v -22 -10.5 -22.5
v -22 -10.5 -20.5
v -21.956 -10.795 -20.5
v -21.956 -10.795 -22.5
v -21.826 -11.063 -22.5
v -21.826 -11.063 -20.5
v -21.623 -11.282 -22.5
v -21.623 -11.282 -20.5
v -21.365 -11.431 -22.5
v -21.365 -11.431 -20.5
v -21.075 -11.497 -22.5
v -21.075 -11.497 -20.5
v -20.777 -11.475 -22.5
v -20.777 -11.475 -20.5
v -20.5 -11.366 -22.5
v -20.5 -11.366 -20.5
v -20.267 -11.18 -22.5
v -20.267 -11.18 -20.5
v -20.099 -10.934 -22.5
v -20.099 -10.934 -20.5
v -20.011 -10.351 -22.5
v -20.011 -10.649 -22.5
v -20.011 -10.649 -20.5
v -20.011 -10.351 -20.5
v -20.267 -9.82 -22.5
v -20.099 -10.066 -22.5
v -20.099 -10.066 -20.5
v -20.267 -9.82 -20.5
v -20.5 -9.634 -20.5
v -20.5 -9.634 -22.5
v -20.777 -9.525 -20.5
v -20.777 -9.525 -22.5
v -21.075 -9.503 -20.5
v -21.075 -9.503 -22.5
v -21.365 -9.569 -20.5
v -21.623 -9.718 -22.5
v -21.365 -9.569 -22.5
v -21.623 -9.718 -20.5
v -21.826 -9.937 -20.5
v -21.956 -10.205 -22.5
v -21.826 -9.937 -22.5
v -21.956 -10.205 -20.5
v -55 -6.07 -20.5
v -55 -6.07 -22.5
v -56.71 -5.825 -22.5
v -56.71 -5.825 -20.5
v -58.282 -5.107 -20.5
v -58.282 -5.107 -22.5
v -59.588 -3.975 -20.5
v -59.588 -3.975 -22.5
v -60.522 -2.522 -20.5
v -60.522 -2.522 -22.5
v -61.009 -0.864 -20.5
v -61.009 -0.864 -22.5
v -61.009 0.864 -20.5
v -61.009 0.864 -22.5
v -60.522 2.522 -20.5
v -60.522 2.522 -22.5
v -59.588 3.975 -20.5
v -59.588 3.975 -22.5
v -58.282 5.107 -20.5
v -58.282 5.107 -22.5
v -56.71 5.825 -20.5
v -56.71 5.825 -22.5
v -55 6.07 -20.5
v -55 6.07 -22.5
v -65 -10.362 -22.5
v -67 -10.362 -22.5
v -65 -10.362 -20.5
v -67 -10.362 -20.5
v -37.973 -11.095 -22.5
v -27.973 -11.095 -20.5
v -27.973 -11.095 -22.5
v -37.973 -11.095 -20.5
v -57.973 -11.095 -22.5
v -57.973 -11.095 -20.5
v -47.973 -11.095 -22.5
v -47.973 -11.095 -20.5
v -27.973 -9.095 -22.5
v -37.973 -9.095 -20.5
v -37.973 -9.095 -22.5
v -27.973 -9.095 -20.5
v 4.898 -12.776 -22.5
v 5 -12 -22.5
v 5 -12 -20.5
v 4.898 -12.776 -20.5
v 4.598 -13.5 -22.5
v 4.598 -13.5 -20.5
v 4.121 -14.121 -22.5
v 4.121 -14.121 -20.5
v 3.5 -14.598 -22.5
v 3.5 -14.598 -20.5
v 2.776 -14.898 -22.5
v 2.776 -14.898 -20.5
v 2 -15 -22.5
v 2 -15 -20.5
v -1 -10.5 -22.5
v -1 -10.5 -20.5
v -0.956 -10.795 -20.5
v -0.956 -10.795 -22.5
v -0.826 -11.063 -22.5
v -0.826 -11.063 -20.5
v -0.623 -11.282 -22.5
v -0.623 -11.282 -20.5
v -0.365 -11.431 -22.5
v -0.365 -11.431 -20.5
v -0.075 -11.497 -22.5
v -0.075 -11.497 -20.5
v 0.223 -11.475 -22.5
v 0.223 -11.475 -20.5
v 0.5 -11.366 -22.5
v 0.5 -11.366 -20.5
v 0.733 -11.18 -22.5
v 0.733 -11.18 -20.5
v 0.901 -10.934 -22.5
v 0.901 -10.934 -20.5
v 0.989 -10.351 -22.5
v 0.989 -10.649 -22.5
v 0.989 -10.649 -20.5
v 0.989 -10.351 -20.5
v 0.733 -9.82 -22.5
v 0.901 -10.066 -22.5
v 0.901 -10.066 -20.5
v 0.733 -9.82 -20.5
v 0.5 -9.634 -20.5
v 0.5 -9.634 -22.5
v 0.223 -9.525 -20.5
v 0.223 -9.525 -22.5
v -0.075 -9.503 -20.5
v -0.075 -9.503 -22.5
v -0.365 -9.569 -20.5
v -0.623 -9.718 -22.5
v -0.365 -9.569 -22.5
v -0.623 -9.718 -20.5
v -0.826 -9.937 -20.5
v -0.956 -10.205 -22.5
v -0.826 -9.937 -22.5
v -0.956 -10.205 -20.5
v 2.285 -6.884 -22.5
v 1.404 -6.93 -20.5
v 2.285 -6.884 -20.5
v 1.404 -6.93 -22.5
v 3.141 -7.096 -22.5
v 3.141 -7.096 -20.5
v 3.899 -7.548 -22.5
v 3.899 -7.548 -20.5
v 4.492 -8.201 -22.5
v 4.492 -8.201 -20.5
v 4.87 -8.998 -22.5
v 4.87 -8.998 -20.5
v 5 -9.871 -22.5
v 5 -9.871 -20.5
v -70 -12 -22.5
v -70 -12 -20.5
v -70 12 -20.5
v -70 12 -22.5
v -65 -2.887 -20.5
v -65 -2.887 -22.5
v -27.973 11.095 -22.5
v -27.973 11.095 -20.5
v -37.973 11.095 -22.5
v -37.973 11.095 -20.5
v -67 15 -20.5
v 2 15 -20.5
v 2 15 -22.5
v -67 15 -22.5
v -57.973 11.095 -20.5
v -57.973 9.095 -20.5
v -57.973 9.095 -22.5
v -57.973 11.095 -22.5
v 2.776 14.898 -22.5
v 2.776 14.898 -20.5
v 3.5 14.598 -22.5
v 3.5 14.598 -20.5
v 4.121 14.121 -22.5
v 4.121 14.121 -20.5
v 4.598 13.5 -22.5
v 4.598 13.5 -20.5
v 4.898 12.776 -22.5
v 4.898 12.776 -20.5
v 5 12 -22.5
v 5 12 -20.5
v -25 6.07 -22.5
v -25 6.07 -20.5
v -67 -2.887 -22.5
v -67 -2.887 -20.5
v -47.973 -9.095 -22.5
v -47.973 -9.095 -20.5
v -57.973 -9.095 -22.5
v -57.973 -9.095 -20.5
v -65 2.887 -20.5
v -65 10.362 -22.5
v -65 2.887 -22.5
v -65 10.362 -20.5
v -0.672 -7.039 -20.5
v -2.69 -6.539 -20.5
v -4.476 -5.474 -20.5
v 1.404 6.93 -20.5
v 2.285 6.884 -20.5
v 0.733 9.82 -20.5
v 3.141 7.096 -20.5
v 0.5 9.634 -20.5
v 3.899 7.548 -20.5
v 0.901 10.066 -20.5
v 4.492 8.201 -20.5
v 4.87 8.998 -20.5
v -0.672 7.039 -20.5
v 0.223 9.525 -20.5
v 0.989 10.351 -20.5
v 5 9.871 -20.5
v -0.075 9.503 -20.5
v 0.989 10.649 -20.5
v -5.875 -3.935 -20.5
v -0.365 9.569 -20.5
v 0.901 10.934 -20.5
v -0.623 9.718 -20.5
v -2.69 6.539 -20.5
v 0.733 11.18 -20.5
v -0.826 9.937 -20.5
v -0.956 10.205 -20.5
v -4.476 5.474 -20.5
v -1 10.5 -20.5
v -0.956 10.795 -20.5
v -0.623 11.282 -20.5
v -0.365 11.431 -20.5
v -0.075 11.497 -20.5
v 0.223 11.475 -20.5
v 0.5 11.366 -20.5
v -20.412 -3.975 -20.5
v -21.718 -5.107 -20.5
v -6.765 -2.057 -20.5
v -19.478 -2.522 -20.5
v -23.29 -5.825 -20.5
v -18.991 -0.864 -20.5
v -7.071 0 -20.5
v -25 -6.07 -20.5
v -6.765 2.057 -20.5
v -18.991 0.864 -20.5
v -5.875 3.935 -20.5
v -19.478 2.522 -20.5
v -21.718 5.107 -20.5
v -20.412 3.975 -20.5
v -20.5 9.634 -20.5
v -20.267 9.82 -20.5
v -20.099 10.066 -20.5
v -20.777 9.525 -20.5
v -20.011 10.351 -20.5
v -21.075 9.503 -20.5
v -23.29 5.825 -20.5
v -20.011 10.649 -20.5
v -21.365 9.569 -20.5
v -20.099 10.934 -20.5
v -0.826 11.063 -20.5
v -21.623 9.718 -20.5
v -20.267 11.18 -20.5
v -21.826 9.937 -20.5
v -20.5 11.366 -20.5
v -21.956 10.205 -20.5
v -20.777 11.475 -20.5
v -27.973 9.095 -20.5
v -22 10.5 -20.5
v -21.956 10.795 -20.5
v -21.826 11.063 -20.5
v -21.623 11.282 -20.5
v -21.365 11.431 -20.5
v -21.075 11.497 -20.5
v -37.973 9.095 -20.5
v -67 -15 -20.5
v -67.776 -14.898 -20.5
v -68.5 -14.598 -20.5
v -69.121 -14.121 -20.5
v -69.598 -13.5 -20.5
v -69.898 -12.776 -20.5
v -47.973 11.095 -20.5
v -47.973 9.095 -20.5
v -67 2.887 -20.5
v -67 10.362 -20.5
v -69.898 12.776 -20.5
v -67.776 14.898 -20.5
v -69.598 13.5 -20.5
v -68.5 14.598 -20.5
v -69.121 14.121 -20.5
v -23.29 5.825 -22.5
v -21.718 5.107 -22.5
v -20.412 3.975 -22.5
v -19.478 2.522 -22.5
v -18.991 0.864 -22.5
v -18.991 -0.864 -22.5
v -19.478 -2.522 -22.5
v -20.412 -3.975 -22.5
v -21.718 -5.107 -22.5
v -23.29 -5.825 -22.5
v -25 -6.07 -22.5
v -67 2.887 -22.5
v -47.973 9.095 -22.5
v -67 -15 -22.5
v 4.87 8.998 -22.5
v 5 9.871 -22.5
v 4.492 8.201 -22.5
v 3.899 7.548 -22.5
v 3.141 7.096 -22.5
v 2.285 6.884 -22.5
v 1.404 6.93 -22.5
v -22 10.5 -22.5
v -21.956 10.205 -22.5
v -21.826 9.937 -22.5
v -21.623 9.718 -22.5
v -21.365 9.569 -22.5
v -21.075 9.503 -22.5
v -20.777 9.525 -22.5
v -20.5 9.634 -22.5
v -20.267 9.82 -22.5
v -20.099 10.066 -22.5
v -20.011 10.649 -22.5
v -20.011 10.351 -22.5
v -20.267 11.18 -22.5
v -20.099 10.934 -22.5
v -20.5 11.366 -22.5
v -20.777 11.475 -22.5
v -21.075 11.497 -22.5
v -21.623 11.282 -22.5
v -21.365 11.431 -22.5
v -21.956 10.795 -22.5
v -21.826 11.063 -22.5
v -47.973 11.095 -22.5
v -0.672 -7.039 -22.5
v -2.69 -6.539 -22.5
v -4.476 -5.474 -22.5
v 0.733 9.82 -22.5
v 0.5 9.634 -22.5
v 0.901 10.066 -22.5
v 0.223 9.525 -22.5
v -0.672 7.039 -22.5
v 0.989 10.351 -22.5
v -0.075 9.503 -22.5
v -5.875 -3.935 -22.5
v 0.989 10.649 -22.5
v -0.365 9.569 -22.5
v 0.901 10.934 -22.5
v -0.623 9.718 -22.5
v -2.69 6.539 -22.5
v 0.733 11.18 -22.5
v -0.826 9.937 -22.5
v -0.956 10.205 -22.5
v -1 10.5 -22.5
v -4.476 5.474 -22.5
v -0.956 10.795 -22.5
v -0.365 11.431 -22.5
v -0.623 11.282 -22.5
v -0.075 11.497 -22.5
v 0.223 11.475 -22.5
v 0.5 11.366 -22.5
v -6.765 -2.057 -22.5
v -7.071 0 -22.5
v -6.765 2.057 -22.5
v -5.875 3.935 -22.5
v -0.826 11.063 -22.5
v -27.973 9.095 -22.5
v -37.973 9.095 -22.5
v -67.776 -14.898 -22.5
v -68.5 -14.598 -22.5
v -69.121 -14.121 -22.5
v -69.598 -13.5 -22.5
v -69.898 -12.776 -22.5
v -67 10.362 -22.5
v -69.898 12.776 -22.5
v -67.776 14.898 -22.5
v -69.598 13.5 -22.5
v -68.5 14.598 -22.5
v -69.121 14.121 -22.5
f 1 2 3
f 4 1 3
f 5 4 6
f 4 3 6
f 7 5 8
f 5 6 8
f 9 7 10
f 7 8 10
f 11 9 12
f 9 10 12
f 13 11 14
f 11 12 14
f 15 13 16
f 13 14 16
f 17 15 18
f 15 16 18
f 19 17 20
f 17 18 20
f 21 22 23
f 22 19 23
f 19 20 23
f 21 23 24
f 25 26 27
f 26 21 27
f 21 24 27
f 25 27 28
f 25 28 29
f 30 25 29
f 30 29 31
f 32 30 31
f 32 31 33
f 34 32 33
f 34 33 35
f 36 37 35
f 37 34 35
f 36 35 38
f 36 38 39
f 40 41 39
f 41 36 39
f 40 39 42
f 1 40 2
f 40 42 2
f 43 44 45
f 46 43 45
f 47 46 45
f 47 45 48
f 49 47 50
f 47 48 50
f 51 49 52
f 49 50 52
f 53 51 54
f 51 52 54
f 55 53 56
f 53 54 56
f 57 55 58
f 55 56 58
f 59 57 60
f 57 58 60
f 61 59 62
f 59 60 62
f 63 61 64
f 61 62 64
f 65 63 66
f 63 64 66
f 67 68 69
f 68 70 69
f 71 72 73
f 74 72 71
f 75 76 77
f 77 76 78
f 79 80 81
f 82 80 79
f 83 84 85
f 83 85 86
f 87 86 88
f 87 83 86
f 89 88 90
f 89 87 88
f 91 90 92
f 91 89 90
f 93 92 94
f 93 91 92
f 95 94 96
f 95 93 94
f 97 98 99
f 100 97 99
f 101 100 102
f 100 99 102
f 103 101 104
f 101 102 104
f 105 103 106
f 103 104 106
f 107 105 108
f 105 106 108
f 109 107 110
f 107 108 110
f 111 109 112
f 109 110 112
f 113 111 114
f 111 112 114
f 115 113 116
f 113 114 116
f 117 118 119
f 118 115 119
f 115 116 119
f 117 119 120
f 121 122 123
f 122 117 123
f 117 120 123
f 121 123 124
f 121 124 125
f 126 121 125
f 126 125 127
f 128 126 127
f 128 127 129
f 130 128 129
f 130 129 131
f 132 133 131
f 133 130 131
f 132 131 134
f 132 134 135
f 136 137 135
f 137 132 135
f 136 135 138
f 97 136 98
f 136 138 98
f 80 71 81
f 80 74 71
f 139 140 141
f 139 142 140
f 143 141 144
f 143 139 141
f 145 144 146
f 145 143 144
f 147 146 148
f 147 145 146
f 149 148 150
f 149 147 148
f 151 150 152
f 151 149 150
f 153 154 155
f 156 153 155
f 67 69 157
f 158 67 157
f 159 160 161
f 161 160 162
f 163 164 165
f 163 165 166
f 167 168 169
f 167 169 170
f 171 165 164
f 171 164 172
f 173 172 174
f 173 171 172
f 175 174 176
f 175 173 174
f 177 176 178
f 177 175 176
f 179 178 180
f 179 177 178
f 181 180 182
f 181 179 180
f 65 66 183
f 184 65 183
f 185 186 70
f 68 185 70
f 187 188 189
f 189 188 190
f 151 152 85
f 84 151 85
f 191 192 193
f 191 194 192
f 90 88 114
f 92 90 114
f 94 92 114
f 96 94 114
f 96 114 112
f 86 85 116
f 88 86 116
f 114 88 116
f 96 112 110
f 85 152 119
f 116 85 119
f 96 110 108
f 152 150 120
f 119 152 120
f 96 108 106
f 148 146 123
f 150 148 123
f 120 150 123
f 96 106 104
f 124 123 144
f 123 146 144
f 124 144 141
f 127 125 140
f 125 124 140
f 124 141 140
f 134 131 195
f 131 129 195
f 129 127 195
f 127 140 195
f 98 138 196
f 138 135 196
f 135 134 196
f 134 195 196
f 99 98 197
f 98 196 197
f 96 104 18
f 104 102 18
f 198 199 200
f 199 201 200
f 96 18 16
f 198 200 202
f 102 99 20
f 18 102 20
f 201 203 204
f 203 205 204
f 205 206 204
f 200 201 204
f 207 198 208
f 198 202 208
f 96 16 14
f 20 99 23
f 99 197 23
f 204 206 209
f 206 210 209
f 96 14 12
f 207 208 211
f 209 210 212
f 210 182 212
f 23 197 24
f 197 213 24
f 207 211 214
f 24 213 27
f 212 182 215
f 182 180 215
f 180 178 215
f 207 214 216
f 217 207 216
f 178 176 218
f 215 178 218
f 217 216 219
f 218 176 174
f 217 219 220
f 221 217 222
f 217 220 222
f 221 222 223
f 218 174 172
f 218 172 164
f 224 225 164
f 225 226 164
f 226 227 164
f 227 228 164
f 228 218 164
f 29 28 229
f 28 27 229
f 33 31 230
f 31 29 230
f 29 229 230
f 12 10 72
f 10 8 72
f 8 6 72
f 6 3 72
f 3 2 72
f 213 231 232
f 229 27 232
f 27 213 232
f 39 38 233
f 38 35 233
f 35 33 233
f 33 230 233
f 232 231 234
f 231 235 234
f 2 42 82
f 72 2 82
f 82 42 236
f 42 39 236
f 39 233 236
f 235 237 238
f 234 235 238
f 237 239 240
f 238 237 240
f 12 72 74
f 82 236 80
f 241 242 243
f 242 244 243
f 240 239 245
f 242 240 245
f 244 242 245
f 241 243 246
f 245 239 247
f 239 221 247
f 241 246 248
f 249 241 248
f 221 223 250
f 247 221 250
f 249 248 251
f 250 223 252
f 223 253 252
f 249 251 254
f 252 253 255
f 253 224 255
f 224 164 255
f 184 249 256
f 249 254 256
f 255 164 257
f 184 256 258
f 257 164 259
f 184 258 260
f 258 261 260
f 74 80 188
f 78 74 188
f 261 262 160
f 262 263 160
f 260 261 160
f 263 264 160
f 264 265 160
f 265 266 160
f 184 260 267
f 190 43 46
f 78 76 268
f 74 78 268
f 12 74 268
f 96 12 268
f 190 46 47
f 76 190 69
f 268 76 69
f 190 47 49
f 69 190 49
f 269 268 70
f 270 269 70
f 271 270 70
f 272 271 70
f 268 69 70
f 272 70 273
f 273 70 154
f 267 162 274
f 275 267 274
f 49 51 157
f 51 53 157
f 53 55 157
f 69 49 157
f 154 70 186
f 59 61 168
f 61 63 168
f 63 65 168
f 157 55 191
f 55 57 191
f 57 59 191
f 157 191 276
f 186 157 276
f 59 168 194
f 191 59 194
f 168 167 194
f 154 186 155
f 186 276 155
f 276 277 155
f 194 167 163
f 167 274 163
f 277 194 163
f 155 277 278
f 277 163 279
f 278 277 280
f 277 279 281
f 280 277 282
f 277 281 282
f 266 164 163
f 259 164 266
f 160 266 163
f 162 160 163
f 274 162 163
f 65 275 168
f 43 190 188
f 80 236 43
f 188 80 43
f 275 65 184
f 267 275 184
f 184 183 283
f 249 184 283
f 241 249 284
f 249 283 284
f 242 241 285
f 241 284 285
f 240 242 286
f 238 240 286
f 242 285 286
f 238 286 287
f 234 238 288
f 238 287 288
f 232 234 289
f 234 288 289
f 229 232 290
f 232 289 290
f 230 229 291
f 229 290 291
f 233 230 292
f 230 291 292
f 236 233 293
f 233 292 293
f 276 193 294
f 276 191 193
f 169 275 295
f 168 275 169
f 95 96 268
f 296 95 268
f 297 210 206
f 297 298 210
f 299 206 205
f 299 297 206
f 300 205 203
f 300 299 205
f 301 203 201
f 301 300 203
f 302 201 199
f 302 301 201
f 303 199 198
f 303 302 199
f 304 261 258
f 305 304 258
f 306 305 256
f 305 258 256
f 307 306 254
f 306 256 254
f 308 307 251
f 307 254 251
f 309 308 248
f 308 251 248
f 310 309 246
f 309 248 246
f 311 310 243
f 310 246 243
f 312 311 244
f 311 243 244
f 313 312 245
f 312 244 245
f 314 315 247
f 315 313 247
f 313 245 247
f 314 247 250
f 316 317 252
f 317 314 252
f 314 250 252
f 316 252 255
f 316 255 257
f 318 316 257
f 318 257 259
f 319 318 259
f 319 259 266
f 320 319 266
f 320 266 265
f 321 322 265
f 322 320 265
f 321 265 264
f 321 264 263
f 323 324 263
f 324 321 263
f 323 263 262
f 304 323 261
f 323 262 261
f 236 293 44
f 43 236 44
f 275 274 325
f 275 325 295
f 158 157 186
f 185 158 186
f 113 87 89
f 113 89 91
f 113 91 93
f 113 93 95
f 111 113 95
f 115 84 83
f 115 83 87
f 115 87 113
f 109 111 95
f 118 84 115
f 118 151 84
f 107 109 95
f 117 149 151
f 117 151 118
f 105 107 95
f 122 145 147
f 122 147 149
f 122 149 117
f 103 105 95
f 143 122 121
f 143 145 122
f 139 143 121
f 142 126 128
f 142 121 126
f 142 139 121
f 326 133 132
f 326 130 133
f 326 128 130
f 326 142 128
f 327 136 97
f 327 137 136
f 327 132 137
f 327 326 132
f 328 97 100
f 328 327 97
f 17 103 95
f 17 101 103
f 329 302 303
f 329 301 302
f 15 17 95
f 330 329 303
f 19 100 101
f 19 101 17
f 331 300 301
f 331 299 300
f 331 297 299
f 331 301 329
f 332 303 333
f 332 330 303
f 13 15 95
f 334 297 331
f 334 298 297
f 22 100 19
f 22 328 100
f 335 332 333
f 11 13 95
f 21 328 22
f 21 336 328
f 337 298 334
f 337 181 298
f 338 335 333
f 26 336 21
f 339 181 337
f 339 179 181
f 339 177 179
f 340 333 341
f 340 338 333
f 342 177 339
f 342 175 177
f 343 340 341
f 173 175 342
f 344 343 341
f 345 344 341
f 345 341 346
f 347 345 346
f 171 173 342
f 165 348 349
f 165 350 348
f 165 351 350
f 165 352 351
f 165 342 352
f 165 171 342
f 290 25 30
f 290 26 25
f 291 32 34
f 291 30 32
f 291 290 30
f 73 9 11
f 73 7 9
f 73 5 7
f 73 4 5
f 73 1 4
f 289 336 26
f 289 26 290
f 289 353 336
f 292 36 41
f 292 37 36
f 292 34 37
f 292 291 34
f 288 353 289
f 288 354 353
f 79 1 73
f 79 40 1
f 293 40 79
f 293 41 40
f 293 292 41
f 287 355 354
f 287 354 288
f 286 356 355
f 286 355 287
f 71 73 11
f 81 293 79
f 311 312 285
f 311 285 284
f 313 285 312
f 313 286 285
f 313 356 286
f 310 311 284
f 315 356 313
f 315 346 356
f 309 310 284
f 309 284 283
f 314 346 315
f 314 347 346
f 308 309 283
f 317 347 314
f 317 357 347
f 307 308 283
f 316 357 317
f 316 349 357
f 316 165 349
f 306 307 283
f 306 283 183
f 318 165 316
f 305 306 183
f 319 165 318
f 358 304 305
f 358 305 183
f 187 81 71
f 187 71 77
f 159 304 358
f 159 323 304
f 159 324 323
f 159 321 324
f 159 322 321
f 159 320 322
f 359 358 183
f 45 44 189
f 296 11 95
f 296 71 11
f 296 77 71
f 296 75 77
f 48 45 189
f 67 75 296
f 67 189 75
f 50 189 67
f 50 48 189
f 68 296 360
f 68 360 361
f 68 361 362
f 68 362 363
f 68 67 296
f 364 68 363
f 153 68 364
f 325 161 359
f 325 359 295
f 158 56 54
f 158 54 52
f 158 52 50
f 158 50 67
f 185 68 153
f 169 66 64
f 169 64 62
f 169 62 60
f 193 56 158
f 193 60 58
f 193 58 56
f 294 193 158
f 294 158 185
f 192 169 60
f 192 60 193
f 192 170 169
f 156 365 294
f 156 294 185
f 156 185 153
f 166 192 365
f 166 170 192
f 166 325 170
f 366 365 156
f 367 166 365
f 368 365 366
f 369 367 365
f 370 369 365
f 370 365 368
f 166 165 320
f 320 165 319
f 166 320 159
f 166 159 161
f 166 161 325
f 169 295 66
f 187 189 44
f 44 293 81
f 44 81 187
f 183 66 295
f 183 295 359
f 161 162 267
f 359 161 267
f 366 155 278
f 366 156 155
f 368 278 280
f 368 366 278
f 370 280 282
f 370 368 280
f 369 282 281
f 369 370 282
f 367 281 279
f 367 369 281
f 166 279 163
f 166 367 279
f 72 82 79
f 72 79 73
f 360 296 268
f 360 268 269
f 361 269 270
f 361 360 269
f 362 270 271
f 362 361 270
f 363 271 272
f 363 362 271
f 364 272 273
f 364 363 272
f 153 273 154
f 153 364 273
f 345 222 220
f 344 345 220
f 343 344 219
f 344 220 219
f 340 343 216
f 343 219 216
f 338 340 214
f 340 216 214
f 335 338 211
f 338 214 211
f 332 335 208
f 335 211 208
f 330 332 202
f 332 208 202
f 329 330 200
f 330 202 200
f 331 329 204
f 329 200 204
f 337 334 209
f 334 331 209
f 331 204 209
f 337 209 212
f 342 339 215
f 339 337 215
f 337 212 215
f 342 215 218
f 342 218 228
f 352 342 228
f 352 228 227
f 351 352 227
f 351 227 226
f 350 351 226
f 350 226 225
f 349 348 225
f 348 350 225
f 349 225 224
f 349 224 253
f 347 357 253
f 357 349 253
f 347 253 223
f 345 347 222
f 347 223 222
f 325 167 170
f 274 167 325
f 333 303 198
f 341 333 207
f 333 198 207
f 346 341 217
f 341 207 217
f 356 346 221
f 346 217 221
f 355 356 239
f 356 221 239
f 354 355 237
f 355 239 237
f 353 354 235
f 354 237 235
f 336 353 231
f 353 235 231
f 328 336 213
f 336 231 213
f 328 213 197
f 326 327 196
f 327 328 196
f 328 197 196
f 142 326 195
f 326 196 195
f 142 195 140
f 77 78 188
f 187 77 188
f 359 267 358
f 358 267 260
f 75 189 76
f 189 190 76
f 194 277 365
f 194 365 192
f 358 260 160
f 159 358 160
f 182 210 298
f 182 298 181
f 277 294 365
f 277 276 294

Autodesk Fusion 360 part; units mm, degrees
sketch "Sketch1" plane through (0, 0, -20.5) normal (0, 0, -1) x (-1, 0, 0)
  line L0 (-5, 0) -> (-5, -15)
  line L1 (-5, -15) -> (70, -15)
  line L2 (70, -15) -> (70, 0)
  circle A0 centre (0, -10.5) radius 1
  circle A1 centre (21, -10.5) radius 1
  circle A2 centre (0, 0) radius 7.0711
  line L3 (67, -10.3624) -> (65, -10.3624)
  line L4 (65, -10.3624) -> (65, -2.8871)
  line L5 (65, -2.8871) -> (67, -2.8871)
  line L6 (67, -2.8871) -> (67, -10.3624)
  line L7 (100, 0) -> (42, 0) construction
  line L8 (-5, 15) -> (70, 15)
  line L9 (70, 15) -> (70, 0)
  line L10 (67, 10.3624) -> (65, 10.3624)
  line L11 (67, 2.8871) -> (67, 10.3624)
  line L12 (65, 10.3624) -> (65, 2.8871)
  line L13 (65, 2.8871) -> (67, 2.8871)
  circle A3 centre (21, 10.5) radius 1
  circle A4 centre (0, 10.5) radius 1
  line L14 (-5, 0) -> (-5, 15)
  line L15 (27.9727, 11.0949) -> (37.9727, 11.0949)
  line L16 (37.9727, 11.0949) -> (37.9727, 9.0949)
  line L17 (37.9727, 9.0949) -> (27.9727, 9.0949)
  line L18 (27.9727, 9.0949) -> (27.9727, 11.0949)
  line L19 (42.9727, 11.2127) -> (42.9727, -12.2873) construction
  line L20 (42.9727, -11.2127) -> (42.9727, 12.2873) construction
  line L21 (37.9727, -11.0949) -> (37.9727, -9.0949)
  line L22 (37.9727, -9.0949) -> (27.9727, -9.0949)
  line L23 (27.9727, -9.0949) -> (27.9727, -11.0949)
  line L24 (27.9727, -11.0949) -> (37.9727, -11.0949)
  line L25 (57.9727, 11.0949) -> (47.9727, 11.0949)
  line L26 (47.9727, 11.0949) -> (47.9727, 9.0949)
  line L27 (47.9727, 9.0949) -> (57.9727, 9.0949)
  line L28 (57.9727, 9.0949) -> (57.9727, 11.0949)
  line L29 (47.9727, -11.0949) -> (47.9727, -9.0949)
  line L30 (57.9727, -9.0949) -> (57.9727, -11.0949)
  line L31 (47.9727, -9.0949) -> (57.9727, -9.0949)
  line L32 (57.9727, -11.0949) -> (47.9727, -11.0949)
  dimension "d1" = 75
  dimension "d3" = 2
  dimension "d4" = 3
  dimension "d77" = 0
  dimension "d78" = 0
  dimension "d79" = 0
  dimension "d80" = 0
  dimension "d93" = 10
  dimension "d94" = 2
  dimension "d95" = 10
extrude "Extrude1" add sketch "Sketch1" along normal blind 2 contours L0 L1 L2 A2 L8 L9 L14
sketch "Sketch2" plane through (0, 0, -22.5) normal (0, 0, -1) x (-1, 0, 0)
  line L0 (25, -6.0704) -> (55, -6.0704)
  arc A0 (55, -6.0704) -> (55, 6.0704) centre (55, 0) ccw
  line L1 (55, 6.0704) -> (25, 6.0704)
  arc A1 (25, 6.0704) -> (25, -6.0704) centre (25, 0) ccw
  line L2 (25, 0) -> (55, 0) construction
  line L3 (100, 0) -> (42, 0)
extrude "Extrude2" cut sketch "Sketch2" against normal blind 2
fillet "Fillet1" radius 3 6 edges at (5, 15, -21.5) (5, 5, -21.5) (5, -5, -21.5) (5, -15, -21.5) (-70, 15, -21.5) (-70, -15, -21.5)
sketch "Sketch3" plane through (0, 0, -20.5) normal (0, 0, 1) x (1, 0, 0)
sketch "projection" plane through (0, 0, -20.5) normal (0, 0, 1) x (1, 0, 0)
  line L0 (-25, -6.0704) -> (-55, -6.0704)
  arc A0 (-55, 6.0704) -> (-55, -6.0704) centre (-55, 0) ccw
  line L1 (-55, 6.0704) -> (-25, 6.0704)
  arc A1 (-25, -6.0704) -> (-25, 6.0704) centre (-25, 0) ccw
  circle A2 centre (-21, 10.5) radius 1
  line L2 (-57.9727, -11.0949) -> (-57.9727, -9.0949)
  line L3 (-57.9727, -9.0949) -> (-47.9727, -9.0949)
  line L4 (-47.9727, -9.0949) -> (-47.9727, -11.0949)
  line L5 (-47.9727, -11.0949) -> (-57.9727, -11.0949)
  circle A3 centre (0, 10.5) radius 1
  line L6 (-65, 2.8871) -> (-67, 2.8871)
  line L7 (-67, 2.8871) -> (-67, 10.3624)
  line L8 (-67, 10.3624) -> (-65, 10.3624)
  line L9 (-65, 10.3624) -> (-65, 2.8871)
  line L10 (-27.9727, -11.0949) -> (-37.9727, -11.0949)
  line L11 (-37.9727, -11.0949) -> (-37.9727, -9.0949)
  line L12 (-37.9727, -9.0949) -> (-27.9727, -9.0949)
  line L13 (-27.9727, -9.0949) -> (-27.9727, -11.0949)
  circle A4 centre (0, -10.5) radius 1
  line L14 (-57.9727, 9.0949) -> (-57.9727, 11.0949)
  line L15 (-57.9727, 11.0949) -> (-47.9727, 11.0949)
  line L16 (-47.9727, 11.0949) -> (-47.9727, 9.0949)
  line L17 (-47.9727, 9.0949) -> (-57.9727, 9.0949)
  circle A5 centre (-21, -10.5) radius 1
  line L18 (-67, -2.8871) -> (-65, -2.8871)
  line L19 (-65, -2.8871) -> (-65, -10.3624)
  line L20 (-65, -10.3624) -> (-67, -10.3624)
  line L21 (-67, -10.3624) -> (-67, -2.8871)
  line L22 (-27.9727, 9.0949) -> (-37.9727, 9.0949)
  line L23 (-37.9727, 9.0949) -> (-37.9727, 11.0949)
  line L24 (-37.9727, 11.0949) -> (-27.9727, 11.0949)
  line L25 (-27.9727, 11.0949) -> (-27.9727, 9.0949)
  arc A6 (-70, -12) -> (-67, -15) centre (-67, -12) ccw
  line L26 (-67, -15) -> (2, -15)
  arc A7 (2, -15) -> (5, -12) centre (2, -12) ccw
  line L27 (5, -12) -> (5, -9.8705)
  arc A8 (5, -9.8705) -> (1.4042, -6.9302) centre (2, -9.8705) ccw
  arc A9 (1.4042, 6.9302) -> (1.4042, -6.9302) centre (0, 0) ccw
  arc A10 (1.4042, 6.9302) -> (5, 9.8705) centre (2, 9.8705) ccw
  line L28 (5, 9.8705) -> (5, 12)
  arc A11 (5, 12) -> (2, 15) centre (2, 12) ccw
  line L29 (2, 15) -> (-67, 15)
  arc A12 (-67, 15) -> (-70, 12) centre (-67, 12) ccw
  line L30 (-70, 12) -> (-70, -12)
equation "thiccness = 2 mm"
equation "d3 = thiccness"
equation "d11 = thiccness"
equation "d94 = thiccness"
equation "d96 = -thiccness"
